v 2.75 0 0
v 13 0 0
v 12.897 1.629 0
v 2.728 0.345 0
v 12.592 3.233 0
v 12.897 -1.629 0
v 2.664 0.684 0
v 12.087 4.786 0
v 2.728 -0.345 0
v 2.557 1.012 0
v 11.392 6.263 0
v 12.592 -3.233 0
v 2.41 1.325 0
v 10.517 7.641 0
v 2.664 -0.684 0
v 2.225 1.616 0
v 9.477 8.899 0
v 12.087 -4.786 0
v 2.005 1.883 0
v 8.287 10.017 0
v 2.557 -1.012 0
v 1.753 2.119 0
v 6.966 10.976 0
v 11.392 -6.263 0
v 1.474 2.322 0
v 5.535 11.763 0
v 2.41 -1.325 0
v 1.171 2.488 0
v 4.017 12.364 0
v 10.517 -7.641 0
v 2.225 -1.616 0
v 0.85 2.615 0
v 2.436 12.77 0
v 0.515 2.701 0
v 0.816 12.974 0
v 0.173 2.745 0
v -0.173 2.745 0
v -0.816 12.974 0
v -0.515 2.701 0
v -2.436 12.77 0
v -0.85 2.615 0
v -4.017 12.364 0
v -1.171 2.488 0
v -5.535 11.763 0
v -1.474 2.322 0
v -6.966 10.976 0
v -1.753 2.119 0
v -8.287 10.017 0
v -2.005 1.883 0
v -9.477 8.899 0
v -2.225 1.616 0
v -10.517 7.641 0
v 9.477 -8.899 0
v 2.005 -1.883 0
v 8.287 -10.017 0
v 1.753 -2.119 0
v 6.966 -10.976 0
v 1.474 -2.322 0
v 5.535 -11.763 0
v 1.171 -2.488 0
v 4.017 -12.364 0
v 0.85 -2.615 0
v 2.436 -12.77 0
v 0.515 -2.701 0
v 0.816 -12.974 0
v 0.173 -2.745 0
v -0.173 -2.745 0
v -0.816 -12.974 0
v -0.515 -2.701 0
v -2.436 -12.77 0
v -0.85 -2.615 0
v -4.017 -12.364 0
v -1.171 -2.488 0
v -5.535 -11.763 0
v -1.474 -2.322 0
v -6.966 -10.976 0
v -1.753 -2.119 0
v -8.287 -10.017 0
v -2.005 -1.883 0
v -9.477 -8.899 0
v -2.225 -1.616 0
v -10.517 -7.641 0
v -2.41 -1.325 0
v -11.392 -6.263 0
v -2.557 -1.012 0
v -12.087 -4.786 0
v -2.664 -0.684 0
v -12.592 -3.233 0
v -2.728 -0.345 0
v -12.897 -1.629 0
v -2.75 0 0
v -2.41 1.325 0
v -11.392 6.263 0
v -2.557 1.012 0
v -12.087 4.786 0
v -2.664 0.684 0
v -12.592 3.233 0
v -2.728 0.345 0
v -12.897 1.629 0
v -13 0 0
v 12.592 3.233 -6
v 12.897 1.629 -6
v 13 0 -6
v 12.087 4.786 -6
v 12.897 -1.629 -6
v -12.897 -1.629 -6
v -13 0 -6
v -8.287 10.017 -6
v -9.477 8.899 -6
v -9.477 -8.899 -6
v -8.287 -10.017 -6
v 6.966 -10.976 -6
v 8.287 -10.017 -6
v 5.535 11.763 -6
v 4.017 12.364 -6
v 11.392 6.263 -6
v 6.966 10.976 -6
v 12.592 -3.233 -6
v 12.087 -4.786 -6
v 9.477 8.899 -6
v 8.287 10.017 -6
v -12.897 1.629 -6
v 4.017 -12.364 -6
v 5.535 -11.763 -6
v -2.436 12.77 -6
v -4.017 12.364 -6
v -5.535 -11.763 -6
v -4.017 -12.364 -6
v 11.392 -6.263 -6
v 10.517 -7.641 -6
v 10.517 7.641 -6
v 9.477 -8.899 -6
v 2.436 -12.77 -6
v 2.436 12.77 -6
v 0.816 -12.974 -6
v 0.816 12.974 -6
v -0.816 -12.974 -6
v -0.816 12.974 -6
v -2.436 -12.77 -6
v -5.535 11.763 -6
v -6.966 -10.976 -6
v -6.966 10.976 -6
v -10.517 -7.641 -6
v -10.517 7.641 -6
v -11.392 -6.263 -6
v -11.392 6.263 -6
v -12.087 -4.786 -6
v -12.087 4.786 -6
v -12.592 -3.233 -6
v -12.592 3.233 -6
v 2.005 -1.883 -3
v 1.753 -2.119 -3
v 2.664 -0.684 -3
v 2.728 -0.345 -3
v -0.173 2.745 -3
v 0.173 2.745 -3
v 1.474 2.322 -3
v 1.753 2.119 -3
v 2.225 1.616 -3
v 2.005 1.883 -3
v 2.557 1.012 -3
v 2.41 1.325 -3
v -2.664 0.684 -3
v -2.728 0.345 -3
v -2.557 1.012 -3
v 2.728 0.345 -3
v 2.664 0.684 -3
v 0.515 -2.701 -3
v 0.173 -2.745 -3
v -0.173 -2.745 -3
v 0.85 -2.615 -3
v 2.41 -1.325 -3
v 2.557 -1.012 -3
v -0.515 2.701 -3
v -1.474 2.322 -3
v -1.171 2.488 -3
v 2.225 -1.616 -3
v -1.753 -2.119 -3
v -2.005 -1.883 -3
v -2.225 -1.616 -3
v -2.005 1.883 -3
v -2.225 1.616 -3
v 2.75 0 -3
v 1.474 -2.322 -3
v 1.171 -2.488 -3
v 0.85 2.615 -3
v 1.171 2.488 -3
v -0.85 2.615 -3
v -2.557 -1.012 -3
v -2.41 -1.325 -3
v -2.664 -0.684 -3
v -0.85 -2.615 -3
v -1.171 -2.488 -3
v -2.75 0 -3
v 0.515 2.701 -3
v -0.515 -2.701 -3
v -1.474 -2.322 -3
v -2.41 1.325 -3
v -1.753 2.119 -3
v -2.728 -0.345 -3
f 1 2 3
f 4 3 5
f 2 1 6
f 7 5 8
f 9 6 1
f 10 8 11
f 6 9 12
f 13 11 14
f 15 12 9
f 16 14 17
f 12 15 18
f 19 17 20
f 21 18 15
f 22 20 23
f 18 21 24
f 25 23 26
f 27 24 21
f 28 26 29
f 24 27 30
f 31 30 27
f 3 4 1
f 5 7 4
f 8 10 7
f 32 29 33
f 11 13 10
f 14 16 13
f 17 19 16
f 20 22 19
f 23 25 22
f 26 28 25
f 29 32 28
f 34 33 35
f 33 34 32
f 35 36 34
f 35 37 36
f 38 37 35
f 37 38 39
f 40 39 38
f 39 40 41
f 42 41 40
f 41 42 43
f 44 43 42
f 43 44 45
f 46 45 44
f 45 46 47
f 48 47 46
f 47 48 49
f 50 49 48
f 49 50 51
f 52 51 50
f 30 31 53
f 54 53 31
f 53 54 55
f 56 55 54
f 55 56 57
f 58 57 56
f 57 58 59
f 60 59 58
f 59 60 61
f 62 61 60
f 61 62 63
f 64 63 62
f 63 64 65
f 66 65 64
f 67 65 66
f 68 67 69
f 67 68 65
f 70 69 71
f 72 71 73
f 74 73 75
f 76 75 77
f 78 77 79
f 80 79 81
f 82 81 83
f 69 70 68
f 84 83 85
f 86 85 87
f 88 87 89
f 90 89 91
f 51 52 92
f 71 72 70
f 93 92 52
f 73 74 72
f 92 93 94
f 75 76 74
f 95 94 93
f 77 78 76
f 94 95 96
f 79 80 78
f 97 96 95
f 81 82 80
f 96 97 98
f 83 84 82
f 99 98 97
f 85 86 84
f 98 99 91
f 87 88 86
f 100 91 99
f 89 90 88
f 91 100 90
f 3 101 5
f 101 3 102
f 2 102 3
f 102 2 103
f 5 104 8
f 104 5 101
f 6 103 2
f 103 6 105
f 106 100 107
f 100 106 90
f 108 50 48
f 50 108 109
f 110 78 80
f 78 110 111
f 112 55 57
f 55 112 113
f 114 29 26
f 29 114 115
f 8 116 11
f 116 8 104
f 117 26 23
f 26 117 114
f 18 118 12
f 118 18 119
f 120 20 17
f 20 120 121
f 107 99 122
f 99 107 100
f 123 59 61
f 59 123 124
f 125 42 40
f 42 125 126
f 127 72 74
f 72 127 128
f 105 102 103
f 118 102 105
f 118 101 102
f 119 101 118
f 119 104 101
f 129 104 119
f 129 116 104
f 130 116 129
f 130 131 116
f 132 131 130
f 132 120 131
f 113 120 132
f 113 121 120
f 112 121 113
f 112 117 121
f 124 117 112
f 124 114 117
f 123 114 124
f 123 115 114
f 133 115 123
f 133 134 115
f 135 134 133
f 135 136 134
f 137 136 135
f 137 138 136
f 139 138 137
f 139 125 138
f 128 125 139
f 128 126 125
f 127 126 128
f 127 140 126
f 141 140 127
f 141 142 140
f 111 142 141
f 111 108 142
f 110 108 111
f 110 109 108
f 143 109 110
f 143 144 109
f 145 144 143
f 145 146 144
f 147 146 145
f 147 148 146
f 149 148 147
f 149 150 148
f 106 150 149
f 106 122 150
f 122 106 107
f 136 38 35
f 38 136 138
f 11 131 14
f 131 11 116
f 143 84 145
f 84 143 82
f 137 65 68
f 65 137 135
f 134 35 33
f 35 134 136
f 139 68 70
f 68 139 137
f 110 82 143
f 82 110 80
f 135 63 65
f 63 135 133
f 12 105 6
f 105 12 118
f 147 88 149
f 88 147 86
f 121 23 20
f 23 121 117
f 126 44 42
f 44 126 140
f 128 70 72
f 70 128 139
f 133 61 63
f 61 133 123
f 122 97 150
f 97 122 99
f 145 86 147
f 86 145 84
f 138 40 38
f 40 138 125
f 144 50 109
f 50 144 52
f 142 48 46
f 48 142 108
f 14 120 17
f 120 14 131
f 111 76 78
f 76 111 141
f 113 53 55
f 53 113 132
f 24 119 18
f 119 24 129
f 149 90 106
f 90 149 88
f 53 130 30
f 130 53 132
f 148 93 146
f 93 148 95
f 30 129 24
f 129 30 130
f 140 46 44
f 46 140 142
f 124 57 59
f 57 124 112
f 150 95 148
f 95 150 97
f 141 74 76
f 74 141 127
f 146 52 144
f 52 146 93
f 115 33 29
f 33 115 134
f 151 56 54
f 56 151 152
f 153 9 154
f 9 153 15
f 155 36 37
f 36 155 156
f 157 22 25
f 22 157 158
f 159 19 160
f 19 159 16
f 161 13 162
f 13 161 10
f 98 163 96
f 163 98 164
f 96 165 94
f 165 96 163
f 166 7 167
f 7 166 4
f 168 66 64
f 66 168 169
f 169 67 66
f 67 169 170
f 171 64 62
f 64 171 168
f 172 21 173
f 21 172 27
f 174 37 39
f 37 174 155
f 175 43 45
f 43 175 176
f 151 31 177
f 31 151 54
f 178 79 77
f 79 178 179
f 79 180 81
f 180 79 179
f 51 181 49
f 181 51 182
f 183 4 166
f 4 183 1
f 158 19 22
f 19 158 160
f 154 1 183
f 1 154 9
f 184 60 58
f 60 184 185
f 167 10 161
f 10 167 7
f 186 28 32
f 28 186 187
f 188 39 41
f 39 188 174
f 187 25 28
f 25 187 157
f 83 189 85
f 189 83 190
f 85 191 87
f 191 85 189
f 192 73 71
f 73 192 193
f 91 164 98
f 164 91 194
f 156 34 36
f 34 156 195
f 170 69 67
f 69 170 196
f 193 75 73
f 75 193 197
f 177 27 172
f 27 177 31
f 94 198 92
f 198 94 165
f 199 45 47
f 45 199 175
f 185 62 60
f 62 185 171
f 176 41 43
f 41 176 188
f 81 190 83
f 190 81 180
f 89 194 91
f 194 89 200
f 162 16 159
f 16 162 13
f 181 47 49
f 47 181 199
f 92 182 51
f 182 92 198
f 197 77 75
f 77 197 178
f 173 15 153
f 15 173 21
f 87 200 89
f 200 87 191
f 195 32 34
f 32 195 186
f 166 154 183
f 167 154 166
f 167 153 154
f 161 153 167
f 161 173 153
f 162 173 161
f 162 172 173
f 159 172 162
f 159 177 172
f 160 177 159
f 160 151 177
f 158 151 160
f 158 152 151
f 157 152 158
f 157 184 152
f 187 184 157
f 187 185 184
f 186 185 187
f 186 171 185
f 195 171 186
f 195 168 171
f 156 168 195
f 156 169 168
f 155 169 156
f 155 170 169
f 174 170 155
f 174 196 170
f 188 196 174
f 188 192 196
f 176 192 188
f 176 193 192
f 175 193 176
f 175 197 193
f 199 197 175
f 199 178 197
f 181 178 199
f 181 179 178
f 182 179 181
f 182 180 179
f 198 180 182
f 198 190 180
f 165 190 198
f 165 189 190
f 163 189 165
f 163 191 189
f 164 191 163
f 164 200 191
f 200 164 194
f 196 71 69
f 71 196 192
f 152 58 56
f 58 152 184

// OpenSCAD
$fn = 50;


difference() {
	union() {
		translate(v = [0, 0, -3.0000000000]) {
			cylinder(h = 3, r = 10.0000000000);
		}
		translate(v = [0, 0, -6.0000000000]) {
			cylinder(h = 6, r = 13.0000000000);
		}
	}
	union() {
		#translate(v = [0, 0, -3]) {
			cylinder(h = 3, r = 2.7500000000);
		}
	}
}
